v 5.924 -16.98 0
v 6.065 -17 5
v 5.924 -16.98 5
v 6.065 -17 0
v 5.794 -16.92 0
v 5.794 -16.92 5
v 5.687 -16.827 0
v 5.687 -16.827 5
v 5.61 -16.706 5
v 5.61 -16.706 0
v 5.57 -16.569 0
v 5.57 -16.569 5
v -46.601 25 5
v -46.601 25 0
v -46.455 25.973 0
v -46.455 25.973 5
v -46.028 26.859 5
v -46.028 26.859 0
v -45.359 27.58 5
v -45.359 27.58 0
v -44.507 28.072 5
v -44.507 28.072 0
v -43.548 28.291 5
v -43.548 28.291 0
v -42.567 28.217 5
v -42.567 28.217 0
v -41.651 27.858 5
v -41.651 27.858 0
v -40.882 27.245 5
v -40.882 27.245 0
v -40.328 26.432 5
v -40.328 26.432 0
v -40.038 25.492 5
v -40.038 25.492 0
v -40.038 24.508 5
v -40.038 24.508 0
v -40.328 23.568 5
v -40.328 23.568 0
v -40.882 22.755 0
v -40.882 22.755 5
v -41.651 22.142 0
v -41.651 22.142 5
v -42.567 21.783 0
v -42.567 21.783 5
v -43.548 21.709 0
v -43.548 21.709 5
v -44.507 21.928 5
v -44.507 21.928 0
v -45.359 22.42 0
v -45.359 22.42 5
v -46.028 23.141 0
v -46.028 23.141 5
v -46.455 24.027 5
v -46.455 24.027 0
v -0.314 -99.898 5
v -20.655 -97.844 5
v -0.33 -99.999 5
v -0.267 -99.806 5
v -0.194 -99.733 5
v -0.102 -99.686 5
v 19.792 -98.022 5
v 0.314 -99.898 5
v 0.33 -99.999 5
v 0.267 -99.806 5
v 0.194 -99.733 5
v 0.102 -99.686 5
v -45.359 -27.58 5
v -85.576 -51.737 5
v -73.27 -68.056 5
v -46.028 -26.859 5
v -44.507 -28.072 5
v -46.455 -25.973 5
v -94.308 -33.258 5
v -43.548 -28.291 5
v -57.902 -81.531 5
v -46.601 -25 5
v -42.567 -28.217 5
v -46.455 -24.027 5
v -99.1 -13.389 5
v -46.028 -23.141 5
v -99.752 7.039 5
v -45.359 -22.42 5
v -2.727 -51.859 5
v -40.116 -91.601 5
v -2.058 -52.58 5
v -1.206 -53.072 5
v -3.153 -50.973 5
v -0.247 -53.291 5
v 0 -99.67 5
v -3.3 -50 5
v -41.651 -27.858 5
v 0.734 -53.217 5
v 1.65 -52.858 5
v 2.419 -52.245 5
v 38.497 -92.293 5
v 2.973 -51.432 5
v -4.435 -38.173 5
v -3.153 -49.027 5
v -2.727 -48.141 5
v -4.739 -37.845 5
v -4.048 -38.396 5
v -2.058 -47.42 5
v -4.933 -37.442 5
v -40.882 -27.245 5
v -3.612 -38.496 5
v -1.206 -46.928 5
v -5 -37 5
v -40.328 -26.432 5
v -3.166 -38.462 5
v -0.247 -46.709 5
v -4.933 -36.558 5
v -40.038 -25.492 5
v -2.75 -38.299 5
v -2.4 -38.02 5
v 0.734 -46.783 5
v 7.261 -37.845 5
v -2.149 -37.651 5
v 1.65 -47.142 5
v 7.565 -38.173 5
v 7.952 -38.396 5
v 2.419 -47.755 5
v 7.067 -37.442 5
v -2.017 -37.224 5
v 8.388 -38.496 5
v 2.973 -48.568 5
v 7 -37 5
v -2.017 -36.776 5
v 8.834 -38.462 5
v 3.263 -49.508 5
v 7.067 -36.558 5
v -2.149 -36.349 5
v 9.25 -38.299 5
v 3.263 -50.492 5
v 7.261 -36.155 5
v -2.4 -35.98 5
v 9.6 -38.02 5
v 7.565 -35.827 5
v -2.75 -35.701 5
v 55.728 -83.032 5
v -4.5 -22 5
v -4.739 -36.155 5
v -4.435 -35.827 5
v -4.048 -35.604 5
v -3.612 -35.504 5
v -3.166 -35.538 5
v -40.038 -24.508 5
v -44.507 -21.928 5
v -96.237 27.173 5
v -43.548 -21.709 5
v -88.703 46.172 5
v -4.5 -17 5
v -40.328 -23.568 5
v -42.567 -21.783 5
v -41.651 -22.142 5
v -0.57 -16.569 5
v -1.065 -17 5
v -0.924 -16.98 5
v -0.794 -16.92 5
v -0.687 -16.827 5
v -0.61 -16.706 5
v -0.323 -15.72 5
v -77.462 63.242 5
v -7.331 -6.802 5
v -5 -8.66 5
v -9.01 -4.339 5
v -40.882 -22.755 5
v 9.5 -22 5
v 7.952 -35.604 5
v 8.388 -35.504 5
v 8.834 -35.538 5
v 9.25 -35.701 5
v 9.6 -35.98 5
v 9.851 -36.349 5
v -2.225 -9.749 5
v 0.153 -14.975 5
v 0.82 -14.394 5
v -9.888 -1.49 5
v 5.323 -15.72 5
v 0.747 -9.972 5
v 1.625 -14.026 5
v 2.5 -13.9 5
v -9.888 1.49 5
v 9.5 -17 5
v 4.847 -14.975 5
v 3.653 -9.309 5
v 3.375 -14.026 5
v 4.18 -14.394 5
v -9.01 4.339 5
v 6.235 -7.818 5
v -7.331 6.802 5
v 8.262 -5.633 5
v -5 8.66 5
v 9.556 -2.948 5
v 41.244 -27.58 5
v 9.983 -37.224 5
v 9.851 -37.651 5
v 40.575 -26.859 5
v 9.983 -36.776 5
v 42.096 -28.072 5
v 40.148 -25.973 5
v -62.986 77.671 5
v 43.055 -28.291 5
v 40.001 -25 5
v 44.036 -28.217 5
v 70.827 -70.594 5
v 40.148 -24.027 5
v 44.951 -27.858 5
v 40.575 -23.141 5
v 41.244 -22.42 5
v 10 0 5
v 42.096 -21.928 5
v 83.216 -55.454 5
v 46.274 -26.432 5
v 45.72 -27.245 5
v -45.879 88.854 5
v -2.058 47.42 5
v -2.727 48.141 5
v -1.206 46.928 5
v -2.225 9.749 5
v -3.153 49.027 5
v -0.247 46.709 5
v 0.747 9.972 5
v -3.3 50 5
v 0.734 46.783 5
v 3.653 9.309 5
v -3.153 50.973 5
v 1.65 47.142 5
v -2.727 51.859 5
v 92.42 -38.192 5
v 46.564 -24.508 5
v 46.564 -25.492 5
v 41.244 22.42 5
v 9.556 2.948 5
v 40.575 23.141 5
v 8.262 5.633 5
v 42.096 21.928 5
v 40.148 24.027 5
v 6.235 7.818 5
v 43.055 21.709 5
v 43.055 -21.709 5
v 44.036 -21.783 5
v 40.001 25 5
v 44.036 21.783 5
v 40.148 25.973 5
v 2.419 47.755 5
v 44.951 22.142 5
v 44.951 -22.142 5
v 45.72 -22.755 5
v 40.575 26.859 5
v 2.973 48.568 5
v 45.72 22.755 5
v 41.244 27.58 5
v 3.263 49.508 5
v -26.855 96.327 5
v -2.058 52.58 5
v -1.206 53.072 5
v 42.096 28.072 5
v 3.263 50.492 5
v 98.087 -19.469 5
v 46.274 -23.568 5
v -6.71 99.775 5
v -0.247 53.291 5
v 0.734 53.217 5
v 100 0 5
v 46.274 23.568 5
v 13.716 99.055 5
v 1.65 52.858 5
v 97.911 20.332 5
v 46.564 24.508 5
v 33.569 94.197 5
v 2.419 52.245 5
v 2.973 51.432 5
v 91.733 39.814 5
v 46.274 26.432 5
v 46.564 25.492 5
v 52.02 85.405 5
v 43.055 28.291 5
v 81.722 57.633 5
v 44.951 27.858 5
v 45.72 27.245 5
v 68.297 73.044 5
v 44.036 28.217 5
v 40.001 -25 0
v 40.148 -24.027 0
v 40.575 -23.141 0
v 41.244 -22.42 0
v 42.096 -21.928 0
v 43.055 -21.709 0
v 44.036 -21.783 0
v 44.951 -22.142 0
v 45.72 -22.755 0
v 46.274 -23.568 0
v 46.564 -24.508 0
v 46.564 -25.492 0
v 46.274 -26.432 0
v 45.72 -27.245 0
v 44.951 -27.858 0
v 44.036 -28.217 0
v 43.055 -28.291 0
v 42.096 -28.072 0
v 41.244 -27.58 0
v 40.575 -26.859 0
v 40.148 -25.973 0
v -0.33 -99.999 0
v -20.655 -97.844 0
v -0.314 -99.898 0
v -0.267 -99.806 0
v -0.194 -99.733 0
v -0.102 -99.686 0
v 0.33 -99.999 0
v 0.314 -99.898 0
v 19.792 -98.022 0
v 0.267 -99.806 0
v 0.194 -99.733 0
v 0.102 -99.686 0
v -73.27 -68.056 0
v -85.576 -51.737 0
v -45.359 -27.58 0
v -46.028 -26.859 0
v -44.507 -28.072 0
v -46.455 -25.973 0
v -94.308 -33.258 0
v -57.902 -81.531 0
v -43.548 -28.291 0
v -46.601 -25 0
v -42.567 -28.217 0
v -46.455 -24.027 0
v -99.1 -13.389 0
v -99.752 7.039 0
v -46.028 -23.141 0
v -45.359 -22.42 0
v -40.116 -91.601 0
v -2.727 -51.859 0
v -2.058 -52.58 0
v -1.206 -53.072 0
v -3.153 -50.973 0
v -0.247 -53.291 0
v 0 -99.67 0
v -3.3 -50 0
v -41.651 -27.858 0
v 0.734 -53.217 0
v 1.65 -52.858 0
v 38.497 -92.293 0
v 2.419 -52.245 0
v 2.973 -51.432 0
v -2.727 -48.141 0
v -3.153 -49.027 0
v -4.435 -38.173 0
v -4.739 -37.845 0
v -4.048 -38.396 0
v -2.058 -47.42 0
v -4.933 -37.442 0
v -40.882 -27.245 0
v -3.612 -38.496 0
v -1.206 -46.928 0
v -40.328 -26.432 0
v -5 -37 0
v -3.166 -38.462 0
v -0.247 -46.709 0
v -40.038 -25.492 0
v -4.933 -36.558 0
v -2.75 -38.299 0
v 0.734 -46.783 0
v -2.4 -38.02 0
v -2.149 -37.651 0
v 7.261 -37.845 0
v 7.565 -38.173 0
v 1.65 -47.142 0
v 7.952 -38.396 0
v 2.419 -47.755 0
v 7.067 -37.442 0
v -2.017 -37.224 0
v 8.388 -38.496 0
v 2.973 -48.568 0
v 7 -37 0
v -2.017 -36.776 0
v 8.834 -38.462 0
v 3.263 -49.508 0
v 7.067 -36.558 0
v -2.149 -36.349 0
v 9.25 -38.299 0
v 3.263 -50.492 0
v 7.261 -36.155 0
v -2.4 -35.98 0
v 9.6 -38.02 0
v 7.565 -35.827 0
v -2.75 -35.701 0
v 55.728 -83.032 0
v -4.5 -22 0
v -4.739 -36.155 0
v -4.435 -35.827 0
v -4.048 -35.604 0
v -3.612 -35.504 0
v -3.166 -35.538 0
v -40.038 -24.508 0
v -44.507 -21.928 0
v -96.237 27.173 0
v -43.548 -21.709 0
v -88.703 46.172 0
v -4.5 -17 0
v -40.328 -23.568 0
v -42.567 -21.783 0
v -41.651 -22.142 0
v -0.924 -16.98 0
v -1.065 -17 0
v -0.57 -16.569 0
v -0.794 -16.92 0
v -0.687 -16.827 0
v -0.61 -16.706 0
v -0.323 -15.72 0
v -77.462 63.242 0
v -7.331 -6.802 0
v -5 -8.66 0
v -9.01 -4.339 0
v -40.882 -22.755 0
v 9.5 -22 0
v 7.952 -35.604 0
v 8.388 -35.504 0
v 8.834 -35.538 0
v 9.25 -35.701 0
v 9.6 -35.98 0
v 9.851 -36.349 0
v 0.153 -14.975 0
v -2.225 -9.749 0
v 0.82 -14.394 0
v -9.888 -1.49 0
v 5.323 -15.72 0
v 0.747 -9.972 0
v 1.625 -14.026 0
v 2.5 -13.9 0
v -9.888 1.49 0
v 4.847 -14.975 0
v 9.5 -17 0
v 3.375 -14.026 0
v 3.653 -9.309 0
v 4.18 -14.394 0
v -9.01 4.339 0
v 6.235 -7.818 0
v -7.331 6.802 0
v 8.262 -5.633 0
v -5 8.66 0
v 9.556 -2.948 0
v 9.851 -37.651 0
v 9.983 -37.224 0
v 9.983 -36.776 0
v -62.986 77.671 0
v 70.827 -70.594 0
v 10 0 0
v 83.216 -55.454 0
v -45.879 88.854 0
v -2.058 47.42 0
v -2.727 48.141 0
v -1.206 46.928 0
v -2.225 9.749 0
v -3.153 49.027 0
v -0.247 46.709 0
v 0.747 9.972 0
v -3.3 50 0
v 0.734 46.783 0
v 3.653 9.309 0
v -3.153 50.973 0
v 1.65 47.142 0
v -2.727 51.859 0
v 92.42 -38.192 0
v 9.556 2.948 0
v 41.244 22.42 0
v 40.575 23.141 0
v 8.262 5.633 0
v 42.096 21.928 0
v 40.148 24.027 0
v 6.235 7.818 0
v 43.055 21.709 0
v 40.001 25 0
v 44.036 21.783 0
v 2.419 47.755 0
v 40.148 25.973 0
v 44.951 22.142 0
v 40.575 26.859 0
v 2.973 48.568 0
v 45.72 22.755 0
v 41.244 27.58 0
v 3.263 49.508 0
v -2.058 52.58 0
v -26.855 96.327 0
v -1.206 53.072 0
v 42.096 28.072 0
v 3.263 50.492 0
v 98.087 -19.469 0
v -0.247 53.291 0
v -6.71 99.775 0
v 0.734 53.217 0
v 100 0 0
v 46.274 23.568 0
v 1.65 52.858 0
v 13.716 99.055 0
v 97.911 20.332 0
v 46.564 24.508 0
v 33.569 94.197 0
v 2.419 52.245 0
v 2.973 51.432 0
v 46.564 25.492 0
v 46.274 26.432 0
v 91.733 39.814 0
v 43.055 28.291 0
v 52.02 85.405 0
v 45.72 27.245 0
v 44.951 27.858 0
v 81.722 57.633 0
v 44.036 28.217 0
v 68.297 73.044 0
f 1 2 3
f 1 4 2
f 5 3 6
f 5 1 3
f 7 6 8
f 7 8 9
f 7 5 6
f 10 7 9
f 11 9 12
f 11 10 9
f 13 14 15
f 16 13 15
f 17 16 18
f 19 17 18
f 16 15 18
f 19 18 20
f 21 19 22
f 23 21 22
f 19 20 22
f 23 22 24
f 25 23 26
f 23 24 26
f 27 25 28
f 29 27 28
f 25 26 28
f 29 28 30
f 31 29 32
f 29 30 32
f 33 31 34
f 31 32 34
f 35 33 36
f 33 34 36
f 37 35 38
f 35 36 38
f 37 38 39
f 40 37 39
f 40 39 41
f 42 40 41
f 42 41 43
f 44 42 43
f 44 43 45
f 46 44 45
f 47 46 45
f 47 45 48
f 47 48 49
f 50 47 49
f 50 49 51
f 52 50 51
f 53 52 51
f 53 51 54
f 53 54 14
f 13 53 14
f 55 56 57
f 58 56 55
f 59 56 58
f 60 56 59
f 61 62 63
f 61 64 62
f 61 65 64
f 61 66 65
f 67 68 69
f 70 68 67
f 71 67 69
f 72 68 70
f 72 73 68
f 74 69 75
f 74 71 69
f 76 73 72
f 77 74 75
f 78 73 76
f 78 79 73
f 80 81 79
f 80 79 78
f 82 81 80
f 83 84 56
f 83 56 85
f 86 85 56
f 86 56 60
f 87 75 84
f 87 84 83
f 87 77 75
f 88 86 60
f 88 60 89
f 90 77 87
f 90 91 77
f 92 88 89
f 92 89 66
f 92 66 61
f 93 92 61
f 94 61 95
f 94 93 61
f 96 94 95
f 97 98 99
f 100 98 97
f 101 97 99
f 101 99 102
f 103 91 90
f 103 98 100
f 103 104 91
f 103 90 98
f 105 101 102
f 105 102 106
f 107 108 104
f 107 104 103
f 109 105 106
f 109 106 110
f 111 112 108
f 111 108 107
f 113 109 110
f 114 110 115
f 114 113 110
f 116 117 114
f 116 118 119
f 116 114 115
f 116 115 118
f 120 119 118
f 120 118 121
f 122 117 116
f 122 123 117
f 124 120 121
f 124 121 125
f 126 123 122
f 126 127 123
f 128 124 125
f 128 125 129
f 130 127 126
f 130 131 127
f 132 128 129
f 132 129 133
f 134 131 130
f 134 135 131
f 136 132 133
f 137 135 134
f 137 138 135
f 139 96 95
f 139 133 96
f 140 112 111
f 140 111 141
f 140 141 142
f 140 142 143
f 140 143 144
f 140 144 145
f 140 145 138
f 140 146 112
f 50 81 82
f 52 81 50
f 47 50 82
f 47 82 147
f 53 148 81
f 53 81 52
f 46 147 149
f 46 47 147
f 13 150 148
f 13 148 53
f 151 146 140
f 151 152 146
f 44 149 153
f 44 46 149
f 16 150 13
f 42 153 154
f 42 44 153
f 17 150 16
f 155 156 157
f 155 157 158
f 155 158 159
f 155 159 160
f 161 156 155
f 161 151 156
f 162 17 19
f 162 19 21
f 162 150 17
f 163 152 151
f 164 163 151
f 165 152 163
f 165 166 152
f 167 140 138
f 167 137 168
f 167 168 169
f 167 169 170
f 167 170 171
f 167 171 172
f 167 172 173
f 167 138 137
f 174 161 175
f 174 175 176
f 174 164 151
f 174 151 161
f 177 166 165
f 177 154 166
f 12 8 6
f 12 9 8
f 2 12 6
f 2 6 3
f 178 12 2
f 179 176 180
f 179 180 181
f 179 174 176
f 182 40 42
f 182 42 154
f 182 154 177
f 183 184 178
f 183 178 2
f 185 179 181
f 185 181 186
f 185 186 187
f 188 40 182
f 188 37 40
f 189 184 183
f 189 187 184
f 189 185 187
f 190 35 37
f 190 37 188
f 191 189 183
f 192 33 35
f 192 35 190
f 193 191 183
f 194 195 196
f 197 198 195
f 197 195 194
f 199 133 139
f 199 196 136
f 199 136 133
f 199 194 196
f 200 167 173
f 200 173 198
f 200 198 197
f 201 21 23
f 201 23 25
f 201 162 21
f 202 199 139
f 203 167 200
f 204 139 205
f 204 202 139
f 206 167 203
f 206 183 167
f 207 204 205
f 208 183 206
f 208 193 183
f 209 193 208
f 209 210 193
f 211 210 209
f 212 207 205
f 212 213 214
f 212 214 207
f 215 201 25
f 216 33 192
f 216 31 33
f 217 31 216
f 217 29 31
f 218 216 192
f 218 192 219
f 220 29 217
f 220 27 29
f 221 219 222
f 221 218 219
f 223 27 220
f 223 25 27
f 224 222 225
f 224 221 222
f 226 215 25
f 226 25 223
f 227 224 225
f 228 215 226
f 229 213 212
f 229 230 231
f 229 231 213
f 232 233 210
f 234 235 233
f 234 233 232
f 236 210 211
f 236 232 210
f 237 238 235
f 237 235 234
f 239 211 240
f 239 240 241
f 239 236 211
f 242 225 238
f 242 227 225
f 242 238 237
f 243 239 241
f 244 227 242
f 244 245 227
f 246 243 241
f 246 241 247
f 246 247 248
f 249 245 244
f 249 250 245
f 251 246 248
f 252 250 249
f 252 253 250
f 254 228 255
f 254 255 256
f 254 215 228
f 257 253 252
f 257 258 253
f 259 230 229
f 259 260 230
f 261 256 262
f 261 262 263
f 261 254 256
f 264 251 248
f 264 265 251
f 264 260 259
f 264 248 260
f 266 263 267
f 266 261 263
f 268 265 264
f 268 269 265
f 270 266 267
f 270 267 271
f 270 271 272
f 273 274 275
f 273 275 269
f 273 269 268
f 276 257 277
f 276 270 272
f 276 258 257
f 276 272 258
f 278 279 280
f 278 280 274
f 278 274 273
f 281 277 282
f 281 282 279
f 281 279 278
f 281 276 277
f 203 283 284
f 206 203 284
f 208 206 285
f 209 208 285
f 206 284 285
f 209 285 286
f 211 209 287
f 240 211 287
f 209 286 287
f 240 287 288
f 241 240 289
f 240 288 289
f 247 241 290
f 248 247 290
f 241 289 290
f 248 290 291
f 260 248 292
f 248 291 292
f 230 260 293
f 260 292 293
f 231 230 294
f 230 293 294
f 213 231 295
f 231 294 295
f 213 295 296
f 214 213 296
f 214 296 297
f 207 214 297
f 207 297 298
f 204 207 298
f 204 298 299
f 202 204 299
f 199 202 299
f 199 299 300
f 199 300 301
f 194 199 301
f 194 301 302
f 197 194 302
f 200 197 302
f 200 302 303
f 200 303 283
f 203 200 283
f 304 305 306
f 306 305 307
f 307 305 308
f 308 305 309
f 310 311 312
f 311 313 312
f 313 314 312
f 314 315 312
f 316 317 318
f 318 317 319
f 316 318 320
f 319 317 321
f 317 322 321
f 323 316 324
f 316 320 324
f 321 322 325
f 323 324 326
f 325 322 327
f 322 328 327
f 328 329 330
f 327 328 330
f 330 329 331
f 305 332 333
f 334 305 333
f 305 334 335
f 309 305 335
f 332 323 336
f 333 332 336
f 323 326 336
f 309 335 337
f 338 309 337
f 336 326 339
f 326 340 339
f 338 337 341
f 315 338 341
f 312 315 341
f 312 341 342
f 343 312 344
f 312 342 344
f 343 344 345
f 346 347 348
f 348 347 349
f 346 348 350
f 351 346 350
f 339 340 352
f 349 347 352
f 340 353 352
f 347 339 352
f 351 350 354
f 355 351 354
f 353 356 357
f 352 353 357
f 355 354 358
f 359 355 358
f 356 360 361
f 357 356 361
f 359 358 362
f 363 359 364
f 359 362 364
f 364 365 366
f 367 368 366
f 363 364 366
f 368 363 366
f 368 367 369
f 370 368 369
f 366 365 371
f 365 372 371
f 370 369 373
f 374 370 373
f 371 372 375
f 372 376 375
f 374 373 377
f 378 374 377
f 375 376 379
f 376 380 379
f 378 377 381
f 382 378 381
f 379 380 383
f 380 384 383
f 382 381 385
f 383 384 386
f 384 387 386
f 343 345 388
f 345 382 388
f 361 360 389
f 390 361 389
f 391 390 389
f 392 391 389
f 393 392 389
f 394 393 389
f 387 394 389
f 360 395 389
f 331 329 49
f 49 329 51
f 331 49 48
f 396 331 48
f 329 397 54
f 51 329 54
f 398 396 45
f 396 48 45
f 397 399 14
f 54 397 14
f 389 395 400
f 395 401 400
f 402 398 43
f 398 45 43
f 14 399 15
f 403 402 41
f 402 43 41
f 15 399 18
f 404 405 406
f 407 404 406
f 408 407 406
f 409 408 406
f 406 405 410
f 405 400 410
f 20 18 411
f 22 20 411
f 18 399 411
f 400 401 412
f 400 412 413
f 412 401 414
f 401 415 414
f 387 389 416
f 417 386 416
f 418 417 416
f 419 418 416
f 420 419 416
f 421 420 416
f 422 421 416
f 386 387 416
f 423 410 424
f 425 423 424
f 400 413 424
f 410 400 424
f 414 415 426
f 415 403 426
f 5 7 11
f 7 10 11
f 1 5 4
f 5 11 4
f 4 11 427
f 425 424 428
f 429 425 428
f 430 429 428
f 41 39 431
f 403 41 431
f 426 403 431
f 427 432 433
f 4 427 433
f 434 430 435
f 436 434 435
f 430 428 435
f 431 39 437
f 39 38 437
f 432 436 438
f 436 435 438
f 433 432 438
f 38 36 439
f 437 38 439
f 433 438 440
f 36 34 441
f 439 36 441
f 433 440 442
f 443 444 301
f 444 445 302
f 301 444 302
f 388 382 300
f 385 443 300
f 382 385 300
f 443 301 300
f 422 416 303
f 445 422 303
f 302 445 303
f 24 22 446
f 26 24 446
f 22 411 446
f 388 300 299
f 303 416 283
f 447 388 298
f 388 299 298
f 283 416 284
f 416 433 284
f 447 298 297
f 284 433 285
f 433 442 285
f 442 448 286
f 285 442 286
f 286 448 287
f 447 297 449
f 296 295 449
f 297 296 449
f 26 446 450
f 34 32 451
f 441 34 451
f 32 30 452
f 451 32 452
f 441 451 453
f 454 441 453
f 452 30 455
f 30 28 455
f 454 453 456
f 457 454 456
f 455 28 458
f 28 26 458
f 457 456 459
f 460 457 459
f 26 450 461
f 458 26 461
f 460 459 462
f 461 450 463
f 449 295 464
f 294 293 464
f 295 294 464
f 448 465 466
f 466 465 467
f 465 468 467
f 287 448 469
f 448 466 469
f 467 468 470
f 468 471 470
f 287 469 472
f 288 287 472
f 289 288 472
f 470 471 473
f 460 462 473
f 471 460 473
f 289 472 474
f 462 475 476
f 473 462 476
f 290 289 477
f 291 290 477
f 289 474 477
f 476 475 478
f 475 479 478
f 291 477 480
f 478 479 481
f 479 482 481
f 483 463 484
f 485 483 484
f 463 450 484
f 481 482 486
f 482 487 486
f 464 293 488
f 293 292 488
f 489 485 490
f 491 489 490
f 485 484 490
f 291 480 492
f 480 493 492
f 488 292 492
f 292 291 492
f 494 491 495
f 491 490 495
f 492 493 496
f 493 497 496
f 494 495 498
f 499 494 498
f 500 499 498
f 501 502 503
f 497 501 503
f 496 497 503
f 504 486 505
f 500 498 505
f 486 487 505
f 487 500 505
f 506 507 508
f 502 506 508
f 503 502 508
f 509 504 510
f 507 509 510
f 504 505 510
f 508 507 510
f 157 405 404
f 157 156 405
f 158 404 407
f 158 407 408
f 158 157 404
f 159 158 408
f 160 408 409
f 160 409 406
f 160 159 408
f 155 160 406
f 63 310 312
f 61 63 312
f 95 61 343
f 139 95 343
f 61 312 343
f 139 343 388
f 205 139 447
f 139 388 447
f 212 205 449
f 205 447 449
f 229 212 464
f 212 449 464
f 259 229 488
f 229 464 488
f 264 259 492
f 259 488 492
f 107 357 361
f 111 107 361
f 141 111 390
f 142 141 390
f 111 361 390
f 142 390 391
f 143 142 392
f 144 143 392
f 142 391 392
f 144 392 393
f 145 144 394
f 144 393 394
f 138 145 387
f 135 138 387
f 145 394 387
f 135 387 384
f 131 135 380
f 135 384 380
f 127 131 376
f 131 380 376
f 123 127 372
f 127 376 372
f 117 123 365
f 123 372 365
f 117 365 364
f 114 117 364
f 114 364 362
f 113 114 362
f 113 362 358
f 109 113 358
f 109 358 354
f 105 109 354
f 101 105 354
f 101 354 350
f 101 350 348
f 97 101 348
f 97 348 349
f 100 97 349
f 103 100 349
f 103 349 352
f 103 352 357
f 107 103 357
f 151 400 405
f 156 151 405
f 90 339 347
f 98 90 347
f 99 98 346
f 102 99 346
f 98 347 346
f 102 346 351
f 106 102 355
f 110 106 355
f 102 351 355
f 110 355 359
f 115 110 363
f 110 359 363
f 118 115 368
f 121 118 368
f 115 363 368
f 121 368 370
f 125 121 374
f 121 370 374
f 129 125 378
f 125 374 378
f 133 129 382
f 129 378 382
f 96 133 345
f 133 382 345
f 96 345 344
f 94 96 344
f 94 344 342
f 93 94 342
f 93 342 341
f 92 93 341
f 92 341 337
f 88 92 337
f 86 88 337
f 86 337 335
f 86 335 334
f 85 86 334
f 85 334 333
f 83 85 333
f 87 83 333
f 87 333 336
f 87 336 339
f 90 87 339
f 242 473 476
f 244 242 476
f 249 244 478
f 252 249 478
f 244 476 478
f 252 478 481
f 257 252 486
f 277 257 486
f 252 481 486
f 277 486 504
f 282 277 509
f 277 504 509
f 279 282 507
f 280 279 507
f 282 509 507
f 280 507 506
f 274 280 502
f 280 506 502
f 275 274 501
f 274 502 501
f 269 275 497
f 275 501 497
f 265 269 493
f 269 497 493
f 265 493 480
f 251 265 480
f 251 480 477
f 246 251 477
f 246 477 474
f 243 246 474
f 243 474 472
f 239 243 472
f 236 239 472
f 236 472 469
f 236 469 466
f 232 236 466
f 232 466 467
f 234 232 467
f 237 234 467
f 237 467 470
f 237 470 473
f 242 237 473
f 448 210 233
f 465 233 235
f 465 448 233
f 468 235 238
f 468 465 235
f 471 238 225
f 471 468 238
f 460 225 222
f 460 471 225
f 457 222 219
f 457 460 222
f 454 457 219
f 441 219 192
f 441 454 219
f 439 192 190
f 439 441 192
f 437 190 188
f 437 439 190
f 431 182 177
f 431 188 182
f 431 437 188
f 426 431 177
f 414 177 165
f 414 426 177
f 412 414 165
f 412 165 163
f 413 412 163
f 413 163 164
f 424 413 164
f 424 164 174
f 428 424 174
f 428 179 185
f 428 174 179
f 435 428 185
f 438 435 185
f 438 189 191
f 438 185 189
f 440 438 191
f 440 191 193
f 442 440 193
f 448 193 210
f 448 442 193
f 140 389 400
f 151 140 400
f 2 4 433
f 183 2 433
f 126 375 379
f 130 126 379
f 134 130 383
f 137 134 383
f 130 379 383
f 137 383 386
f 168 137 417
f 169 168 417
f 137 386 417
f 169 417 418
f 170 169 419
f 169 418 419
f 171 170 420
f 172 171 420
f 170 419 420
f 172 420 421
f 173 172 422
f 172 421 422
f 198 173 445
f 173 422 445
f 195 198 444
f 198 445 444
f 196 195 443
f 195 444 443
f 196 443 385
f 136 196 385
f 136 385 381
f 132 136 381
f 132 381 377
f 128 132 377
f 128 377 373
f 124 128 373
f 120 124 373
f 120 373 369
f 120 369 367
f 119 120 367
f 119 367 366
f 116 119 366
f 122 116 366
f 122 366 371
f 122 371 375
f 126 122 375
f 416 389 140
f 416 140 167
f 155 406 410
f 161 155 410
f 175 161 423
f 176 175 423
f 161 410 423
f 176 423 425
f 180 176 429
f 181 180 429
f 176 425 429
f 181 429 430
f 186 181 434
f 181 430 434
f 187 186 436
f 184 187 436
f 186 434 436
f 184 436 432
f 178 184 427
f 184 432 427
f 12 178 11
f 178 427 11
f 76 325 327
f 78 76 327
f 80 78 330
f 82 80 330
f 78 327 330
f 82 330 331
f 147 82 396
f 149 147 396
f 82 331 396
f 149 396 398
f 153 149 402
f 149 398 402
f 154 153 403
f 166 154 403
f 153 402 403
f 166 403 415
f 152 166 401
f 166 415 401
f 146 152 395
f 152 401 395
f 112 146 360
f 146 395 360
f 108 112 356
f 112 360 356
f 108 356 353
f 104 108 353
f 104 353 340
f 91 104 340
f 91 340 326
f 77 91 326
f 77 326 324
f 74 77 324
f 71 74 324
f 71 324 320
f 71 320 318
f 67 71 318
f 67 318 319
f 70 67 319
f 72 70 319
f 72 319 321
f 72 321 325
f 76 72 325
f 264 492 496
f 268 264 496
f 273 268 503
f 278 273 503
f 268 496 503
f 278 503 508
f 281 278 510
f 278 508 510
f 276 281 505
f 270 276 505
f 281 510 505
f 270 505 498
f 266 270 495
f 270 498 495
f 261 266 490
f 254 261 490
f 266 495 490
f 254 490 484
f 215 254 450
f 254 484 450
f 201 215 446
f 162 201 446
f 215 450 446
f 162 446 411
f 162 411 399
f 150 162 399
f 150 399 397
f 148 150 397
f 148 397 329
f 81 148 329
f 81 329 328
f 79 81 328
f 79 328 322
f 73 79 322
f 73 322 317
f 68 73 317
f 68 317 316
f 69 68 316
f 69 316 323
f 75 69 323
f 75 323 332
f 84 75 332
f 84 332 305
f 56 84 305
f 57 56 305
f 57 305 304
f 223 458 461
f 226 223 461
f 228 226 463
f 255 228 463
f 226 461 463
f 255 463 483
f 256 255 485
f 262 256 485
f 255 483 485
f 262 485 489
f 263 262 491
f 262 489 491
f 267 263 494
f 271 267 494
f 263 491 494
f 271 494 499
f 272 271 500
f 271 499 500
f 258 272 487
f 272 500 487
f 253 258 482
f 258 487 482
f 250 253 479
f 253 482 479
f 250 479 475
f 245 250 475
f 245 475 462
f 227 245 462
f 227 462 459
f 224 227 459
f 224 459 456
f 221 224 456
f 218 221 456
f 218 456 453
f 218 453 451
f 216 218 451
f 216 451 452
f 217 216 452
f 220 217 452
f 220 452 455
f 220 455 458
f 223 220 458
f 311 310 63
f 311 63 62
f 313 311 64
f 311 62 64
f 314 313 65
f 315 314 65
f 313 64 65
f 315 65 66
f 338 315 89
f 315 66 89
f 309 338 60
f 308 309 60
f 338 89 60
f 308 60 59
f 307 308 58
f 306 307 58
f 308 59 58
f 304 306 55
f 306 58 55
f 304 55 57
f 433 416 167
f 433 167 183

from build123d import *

# Parameters (mm, degrees)
SKETCH1_R                = 100
BOSS_EXTRUDE1_DEPTH      = 5
SKETCH4_R                = 3
CUT_EXTRUDE2_DEPTH       = 142.509716981
CIRPATTERN1_COUNT        = 6
M6_CLEARANCE_HOLE1_D     = 6.6
SKETCH7_W                = 14
SKETCH7_H                = 5
CUT_EXTRUDE3_DEPTH       = 142.509716981
SKETCH8_R                = 1
SKETCH8_R_2              = 3.1
CUT_EXTRUDE4_DEPTH       = 142.509716981
F_0000_CLEARANCE_HOLE3_D = 0.6604
FILLET1_R                = 0.5
SKETCH20_R               = 1.5
CUT_EXTRUDE6_DEPTH       = 142.509716981
SKETCH21_R               = 10
CUT_EXTRUDE9_DEPTH       = 142.509716981


with BuildPart() as part:
    # Sketch1 → Boss-Extrude1 (new body)
    with BuildSketch(Plane.XY):
        Circle(SKETCH1_R)
    extrude(amount=BOSS_EXTRUDE1_DEPTH)

    # Sketch4 → Cut-Extrude2 (cut, through all)
    with BuildSketch(Plane.XY):
        with Locations((0, 50)):
            Circle(SKETCH4_R)
    cut_extrude2 = extrude(amount=CUT_EXTRUDE2_DEPTH, mode=Mode.SUBTRACT)

    # CirPattern1: Cut-Extrude2 ×6 about axis
    cirpattern1_axis = Axis((0, 0, 0), (0, 0, 1))
    for i in range(1, CIRPATTERN1_COUNT):
        add(cut_extrude2.rotate(cirpattern1_axis, i * 360 / CIRPATTERN1_COUNT), mode=Mode.SUBTRACT)

    # M6 Clearance Hole1 (through all)
    with Locations(Plane.XY.offset(5)):
        with Locations((0, 50), (43.301270189, 25), (43.301270189, -25), (0, -50), (-43.301270189, -25), (-43.301270189, 25)):
            Hole(M6_CLEARANCE_HOLE1_D / 2)

    # Sketch7 → Cut-Extrude3 (cut, through all)
    with BuildSketch(Plane.XY):
        with Locations((2.5, -19.5)):
            Rectangle(SKETCH7_W, SKETCH7_H)
    extrude(amount=CUT_EXTRUDE3_DEPTH, mode=Mode.SUBTRACT)

    # Sketch8 → Cut-Extrude4 (cut, through all)
    with BuildSketch(Plane(origin=(0, 0, 0), x_dir=(-1, 0, 0), z_dir=(0, 0, -1))):
        with Locations((-2.5, 4)):
            Circle(SKETCH8_R)
        with Locations((-2.5, -17)):
            Circle(SKETCH8_R_2)
    extrude(amount=-CUT_EXTRUDE4_DEPTH, mode=Mode.SUBTRACT)

    # #0000 Clearance Hole3 (through all)
    with Locations(Plane(origin=(0, 0, 0), x_dir=(-1, 0, 0), z_dir=(0, 0, -1))):
        with Locations((-2.5, 4), (0, 0), (0, -100)):
            Hole(F_0000_CLEARANCE_HOLE3_D / 2)

    # Fillet1
    fillet1_edges = [part.edges().sort_by_distance(p)[0] for p in [
        (5.6, -17, 2.5),
        (-0.6, -17, 2.5),
    ]]
    fillet(fillet1_edges, radius=FILLET1_R)

    # Sketch20 → Cut-Extrude6 (cut, through all)
    with BuildSketch(Plane(origin=(0, 0, 0), x_dir=(-1, 0, 0), z_dir=(0, 0, -1))):
        with Locations((-8.5, -37)):
            Circle(SKETCH20_R)
        with Locations((3.5, -37)):
            Circle(SKETCH20_R)
    extrude(amount=-CUT_EXTRUDE6_DEPTH, mode=Mode.SUBTRACT)

    # Sketch21 → Cut-Extrude9 (cut, through all)
    with BuildSketch(Plane.XY):
        Circle(SKETCH21_R)
    extrude(amount=CUT_EXTRUDE9_DEPTH, mode=Mode.SUBTRACT)


solid = part.part
